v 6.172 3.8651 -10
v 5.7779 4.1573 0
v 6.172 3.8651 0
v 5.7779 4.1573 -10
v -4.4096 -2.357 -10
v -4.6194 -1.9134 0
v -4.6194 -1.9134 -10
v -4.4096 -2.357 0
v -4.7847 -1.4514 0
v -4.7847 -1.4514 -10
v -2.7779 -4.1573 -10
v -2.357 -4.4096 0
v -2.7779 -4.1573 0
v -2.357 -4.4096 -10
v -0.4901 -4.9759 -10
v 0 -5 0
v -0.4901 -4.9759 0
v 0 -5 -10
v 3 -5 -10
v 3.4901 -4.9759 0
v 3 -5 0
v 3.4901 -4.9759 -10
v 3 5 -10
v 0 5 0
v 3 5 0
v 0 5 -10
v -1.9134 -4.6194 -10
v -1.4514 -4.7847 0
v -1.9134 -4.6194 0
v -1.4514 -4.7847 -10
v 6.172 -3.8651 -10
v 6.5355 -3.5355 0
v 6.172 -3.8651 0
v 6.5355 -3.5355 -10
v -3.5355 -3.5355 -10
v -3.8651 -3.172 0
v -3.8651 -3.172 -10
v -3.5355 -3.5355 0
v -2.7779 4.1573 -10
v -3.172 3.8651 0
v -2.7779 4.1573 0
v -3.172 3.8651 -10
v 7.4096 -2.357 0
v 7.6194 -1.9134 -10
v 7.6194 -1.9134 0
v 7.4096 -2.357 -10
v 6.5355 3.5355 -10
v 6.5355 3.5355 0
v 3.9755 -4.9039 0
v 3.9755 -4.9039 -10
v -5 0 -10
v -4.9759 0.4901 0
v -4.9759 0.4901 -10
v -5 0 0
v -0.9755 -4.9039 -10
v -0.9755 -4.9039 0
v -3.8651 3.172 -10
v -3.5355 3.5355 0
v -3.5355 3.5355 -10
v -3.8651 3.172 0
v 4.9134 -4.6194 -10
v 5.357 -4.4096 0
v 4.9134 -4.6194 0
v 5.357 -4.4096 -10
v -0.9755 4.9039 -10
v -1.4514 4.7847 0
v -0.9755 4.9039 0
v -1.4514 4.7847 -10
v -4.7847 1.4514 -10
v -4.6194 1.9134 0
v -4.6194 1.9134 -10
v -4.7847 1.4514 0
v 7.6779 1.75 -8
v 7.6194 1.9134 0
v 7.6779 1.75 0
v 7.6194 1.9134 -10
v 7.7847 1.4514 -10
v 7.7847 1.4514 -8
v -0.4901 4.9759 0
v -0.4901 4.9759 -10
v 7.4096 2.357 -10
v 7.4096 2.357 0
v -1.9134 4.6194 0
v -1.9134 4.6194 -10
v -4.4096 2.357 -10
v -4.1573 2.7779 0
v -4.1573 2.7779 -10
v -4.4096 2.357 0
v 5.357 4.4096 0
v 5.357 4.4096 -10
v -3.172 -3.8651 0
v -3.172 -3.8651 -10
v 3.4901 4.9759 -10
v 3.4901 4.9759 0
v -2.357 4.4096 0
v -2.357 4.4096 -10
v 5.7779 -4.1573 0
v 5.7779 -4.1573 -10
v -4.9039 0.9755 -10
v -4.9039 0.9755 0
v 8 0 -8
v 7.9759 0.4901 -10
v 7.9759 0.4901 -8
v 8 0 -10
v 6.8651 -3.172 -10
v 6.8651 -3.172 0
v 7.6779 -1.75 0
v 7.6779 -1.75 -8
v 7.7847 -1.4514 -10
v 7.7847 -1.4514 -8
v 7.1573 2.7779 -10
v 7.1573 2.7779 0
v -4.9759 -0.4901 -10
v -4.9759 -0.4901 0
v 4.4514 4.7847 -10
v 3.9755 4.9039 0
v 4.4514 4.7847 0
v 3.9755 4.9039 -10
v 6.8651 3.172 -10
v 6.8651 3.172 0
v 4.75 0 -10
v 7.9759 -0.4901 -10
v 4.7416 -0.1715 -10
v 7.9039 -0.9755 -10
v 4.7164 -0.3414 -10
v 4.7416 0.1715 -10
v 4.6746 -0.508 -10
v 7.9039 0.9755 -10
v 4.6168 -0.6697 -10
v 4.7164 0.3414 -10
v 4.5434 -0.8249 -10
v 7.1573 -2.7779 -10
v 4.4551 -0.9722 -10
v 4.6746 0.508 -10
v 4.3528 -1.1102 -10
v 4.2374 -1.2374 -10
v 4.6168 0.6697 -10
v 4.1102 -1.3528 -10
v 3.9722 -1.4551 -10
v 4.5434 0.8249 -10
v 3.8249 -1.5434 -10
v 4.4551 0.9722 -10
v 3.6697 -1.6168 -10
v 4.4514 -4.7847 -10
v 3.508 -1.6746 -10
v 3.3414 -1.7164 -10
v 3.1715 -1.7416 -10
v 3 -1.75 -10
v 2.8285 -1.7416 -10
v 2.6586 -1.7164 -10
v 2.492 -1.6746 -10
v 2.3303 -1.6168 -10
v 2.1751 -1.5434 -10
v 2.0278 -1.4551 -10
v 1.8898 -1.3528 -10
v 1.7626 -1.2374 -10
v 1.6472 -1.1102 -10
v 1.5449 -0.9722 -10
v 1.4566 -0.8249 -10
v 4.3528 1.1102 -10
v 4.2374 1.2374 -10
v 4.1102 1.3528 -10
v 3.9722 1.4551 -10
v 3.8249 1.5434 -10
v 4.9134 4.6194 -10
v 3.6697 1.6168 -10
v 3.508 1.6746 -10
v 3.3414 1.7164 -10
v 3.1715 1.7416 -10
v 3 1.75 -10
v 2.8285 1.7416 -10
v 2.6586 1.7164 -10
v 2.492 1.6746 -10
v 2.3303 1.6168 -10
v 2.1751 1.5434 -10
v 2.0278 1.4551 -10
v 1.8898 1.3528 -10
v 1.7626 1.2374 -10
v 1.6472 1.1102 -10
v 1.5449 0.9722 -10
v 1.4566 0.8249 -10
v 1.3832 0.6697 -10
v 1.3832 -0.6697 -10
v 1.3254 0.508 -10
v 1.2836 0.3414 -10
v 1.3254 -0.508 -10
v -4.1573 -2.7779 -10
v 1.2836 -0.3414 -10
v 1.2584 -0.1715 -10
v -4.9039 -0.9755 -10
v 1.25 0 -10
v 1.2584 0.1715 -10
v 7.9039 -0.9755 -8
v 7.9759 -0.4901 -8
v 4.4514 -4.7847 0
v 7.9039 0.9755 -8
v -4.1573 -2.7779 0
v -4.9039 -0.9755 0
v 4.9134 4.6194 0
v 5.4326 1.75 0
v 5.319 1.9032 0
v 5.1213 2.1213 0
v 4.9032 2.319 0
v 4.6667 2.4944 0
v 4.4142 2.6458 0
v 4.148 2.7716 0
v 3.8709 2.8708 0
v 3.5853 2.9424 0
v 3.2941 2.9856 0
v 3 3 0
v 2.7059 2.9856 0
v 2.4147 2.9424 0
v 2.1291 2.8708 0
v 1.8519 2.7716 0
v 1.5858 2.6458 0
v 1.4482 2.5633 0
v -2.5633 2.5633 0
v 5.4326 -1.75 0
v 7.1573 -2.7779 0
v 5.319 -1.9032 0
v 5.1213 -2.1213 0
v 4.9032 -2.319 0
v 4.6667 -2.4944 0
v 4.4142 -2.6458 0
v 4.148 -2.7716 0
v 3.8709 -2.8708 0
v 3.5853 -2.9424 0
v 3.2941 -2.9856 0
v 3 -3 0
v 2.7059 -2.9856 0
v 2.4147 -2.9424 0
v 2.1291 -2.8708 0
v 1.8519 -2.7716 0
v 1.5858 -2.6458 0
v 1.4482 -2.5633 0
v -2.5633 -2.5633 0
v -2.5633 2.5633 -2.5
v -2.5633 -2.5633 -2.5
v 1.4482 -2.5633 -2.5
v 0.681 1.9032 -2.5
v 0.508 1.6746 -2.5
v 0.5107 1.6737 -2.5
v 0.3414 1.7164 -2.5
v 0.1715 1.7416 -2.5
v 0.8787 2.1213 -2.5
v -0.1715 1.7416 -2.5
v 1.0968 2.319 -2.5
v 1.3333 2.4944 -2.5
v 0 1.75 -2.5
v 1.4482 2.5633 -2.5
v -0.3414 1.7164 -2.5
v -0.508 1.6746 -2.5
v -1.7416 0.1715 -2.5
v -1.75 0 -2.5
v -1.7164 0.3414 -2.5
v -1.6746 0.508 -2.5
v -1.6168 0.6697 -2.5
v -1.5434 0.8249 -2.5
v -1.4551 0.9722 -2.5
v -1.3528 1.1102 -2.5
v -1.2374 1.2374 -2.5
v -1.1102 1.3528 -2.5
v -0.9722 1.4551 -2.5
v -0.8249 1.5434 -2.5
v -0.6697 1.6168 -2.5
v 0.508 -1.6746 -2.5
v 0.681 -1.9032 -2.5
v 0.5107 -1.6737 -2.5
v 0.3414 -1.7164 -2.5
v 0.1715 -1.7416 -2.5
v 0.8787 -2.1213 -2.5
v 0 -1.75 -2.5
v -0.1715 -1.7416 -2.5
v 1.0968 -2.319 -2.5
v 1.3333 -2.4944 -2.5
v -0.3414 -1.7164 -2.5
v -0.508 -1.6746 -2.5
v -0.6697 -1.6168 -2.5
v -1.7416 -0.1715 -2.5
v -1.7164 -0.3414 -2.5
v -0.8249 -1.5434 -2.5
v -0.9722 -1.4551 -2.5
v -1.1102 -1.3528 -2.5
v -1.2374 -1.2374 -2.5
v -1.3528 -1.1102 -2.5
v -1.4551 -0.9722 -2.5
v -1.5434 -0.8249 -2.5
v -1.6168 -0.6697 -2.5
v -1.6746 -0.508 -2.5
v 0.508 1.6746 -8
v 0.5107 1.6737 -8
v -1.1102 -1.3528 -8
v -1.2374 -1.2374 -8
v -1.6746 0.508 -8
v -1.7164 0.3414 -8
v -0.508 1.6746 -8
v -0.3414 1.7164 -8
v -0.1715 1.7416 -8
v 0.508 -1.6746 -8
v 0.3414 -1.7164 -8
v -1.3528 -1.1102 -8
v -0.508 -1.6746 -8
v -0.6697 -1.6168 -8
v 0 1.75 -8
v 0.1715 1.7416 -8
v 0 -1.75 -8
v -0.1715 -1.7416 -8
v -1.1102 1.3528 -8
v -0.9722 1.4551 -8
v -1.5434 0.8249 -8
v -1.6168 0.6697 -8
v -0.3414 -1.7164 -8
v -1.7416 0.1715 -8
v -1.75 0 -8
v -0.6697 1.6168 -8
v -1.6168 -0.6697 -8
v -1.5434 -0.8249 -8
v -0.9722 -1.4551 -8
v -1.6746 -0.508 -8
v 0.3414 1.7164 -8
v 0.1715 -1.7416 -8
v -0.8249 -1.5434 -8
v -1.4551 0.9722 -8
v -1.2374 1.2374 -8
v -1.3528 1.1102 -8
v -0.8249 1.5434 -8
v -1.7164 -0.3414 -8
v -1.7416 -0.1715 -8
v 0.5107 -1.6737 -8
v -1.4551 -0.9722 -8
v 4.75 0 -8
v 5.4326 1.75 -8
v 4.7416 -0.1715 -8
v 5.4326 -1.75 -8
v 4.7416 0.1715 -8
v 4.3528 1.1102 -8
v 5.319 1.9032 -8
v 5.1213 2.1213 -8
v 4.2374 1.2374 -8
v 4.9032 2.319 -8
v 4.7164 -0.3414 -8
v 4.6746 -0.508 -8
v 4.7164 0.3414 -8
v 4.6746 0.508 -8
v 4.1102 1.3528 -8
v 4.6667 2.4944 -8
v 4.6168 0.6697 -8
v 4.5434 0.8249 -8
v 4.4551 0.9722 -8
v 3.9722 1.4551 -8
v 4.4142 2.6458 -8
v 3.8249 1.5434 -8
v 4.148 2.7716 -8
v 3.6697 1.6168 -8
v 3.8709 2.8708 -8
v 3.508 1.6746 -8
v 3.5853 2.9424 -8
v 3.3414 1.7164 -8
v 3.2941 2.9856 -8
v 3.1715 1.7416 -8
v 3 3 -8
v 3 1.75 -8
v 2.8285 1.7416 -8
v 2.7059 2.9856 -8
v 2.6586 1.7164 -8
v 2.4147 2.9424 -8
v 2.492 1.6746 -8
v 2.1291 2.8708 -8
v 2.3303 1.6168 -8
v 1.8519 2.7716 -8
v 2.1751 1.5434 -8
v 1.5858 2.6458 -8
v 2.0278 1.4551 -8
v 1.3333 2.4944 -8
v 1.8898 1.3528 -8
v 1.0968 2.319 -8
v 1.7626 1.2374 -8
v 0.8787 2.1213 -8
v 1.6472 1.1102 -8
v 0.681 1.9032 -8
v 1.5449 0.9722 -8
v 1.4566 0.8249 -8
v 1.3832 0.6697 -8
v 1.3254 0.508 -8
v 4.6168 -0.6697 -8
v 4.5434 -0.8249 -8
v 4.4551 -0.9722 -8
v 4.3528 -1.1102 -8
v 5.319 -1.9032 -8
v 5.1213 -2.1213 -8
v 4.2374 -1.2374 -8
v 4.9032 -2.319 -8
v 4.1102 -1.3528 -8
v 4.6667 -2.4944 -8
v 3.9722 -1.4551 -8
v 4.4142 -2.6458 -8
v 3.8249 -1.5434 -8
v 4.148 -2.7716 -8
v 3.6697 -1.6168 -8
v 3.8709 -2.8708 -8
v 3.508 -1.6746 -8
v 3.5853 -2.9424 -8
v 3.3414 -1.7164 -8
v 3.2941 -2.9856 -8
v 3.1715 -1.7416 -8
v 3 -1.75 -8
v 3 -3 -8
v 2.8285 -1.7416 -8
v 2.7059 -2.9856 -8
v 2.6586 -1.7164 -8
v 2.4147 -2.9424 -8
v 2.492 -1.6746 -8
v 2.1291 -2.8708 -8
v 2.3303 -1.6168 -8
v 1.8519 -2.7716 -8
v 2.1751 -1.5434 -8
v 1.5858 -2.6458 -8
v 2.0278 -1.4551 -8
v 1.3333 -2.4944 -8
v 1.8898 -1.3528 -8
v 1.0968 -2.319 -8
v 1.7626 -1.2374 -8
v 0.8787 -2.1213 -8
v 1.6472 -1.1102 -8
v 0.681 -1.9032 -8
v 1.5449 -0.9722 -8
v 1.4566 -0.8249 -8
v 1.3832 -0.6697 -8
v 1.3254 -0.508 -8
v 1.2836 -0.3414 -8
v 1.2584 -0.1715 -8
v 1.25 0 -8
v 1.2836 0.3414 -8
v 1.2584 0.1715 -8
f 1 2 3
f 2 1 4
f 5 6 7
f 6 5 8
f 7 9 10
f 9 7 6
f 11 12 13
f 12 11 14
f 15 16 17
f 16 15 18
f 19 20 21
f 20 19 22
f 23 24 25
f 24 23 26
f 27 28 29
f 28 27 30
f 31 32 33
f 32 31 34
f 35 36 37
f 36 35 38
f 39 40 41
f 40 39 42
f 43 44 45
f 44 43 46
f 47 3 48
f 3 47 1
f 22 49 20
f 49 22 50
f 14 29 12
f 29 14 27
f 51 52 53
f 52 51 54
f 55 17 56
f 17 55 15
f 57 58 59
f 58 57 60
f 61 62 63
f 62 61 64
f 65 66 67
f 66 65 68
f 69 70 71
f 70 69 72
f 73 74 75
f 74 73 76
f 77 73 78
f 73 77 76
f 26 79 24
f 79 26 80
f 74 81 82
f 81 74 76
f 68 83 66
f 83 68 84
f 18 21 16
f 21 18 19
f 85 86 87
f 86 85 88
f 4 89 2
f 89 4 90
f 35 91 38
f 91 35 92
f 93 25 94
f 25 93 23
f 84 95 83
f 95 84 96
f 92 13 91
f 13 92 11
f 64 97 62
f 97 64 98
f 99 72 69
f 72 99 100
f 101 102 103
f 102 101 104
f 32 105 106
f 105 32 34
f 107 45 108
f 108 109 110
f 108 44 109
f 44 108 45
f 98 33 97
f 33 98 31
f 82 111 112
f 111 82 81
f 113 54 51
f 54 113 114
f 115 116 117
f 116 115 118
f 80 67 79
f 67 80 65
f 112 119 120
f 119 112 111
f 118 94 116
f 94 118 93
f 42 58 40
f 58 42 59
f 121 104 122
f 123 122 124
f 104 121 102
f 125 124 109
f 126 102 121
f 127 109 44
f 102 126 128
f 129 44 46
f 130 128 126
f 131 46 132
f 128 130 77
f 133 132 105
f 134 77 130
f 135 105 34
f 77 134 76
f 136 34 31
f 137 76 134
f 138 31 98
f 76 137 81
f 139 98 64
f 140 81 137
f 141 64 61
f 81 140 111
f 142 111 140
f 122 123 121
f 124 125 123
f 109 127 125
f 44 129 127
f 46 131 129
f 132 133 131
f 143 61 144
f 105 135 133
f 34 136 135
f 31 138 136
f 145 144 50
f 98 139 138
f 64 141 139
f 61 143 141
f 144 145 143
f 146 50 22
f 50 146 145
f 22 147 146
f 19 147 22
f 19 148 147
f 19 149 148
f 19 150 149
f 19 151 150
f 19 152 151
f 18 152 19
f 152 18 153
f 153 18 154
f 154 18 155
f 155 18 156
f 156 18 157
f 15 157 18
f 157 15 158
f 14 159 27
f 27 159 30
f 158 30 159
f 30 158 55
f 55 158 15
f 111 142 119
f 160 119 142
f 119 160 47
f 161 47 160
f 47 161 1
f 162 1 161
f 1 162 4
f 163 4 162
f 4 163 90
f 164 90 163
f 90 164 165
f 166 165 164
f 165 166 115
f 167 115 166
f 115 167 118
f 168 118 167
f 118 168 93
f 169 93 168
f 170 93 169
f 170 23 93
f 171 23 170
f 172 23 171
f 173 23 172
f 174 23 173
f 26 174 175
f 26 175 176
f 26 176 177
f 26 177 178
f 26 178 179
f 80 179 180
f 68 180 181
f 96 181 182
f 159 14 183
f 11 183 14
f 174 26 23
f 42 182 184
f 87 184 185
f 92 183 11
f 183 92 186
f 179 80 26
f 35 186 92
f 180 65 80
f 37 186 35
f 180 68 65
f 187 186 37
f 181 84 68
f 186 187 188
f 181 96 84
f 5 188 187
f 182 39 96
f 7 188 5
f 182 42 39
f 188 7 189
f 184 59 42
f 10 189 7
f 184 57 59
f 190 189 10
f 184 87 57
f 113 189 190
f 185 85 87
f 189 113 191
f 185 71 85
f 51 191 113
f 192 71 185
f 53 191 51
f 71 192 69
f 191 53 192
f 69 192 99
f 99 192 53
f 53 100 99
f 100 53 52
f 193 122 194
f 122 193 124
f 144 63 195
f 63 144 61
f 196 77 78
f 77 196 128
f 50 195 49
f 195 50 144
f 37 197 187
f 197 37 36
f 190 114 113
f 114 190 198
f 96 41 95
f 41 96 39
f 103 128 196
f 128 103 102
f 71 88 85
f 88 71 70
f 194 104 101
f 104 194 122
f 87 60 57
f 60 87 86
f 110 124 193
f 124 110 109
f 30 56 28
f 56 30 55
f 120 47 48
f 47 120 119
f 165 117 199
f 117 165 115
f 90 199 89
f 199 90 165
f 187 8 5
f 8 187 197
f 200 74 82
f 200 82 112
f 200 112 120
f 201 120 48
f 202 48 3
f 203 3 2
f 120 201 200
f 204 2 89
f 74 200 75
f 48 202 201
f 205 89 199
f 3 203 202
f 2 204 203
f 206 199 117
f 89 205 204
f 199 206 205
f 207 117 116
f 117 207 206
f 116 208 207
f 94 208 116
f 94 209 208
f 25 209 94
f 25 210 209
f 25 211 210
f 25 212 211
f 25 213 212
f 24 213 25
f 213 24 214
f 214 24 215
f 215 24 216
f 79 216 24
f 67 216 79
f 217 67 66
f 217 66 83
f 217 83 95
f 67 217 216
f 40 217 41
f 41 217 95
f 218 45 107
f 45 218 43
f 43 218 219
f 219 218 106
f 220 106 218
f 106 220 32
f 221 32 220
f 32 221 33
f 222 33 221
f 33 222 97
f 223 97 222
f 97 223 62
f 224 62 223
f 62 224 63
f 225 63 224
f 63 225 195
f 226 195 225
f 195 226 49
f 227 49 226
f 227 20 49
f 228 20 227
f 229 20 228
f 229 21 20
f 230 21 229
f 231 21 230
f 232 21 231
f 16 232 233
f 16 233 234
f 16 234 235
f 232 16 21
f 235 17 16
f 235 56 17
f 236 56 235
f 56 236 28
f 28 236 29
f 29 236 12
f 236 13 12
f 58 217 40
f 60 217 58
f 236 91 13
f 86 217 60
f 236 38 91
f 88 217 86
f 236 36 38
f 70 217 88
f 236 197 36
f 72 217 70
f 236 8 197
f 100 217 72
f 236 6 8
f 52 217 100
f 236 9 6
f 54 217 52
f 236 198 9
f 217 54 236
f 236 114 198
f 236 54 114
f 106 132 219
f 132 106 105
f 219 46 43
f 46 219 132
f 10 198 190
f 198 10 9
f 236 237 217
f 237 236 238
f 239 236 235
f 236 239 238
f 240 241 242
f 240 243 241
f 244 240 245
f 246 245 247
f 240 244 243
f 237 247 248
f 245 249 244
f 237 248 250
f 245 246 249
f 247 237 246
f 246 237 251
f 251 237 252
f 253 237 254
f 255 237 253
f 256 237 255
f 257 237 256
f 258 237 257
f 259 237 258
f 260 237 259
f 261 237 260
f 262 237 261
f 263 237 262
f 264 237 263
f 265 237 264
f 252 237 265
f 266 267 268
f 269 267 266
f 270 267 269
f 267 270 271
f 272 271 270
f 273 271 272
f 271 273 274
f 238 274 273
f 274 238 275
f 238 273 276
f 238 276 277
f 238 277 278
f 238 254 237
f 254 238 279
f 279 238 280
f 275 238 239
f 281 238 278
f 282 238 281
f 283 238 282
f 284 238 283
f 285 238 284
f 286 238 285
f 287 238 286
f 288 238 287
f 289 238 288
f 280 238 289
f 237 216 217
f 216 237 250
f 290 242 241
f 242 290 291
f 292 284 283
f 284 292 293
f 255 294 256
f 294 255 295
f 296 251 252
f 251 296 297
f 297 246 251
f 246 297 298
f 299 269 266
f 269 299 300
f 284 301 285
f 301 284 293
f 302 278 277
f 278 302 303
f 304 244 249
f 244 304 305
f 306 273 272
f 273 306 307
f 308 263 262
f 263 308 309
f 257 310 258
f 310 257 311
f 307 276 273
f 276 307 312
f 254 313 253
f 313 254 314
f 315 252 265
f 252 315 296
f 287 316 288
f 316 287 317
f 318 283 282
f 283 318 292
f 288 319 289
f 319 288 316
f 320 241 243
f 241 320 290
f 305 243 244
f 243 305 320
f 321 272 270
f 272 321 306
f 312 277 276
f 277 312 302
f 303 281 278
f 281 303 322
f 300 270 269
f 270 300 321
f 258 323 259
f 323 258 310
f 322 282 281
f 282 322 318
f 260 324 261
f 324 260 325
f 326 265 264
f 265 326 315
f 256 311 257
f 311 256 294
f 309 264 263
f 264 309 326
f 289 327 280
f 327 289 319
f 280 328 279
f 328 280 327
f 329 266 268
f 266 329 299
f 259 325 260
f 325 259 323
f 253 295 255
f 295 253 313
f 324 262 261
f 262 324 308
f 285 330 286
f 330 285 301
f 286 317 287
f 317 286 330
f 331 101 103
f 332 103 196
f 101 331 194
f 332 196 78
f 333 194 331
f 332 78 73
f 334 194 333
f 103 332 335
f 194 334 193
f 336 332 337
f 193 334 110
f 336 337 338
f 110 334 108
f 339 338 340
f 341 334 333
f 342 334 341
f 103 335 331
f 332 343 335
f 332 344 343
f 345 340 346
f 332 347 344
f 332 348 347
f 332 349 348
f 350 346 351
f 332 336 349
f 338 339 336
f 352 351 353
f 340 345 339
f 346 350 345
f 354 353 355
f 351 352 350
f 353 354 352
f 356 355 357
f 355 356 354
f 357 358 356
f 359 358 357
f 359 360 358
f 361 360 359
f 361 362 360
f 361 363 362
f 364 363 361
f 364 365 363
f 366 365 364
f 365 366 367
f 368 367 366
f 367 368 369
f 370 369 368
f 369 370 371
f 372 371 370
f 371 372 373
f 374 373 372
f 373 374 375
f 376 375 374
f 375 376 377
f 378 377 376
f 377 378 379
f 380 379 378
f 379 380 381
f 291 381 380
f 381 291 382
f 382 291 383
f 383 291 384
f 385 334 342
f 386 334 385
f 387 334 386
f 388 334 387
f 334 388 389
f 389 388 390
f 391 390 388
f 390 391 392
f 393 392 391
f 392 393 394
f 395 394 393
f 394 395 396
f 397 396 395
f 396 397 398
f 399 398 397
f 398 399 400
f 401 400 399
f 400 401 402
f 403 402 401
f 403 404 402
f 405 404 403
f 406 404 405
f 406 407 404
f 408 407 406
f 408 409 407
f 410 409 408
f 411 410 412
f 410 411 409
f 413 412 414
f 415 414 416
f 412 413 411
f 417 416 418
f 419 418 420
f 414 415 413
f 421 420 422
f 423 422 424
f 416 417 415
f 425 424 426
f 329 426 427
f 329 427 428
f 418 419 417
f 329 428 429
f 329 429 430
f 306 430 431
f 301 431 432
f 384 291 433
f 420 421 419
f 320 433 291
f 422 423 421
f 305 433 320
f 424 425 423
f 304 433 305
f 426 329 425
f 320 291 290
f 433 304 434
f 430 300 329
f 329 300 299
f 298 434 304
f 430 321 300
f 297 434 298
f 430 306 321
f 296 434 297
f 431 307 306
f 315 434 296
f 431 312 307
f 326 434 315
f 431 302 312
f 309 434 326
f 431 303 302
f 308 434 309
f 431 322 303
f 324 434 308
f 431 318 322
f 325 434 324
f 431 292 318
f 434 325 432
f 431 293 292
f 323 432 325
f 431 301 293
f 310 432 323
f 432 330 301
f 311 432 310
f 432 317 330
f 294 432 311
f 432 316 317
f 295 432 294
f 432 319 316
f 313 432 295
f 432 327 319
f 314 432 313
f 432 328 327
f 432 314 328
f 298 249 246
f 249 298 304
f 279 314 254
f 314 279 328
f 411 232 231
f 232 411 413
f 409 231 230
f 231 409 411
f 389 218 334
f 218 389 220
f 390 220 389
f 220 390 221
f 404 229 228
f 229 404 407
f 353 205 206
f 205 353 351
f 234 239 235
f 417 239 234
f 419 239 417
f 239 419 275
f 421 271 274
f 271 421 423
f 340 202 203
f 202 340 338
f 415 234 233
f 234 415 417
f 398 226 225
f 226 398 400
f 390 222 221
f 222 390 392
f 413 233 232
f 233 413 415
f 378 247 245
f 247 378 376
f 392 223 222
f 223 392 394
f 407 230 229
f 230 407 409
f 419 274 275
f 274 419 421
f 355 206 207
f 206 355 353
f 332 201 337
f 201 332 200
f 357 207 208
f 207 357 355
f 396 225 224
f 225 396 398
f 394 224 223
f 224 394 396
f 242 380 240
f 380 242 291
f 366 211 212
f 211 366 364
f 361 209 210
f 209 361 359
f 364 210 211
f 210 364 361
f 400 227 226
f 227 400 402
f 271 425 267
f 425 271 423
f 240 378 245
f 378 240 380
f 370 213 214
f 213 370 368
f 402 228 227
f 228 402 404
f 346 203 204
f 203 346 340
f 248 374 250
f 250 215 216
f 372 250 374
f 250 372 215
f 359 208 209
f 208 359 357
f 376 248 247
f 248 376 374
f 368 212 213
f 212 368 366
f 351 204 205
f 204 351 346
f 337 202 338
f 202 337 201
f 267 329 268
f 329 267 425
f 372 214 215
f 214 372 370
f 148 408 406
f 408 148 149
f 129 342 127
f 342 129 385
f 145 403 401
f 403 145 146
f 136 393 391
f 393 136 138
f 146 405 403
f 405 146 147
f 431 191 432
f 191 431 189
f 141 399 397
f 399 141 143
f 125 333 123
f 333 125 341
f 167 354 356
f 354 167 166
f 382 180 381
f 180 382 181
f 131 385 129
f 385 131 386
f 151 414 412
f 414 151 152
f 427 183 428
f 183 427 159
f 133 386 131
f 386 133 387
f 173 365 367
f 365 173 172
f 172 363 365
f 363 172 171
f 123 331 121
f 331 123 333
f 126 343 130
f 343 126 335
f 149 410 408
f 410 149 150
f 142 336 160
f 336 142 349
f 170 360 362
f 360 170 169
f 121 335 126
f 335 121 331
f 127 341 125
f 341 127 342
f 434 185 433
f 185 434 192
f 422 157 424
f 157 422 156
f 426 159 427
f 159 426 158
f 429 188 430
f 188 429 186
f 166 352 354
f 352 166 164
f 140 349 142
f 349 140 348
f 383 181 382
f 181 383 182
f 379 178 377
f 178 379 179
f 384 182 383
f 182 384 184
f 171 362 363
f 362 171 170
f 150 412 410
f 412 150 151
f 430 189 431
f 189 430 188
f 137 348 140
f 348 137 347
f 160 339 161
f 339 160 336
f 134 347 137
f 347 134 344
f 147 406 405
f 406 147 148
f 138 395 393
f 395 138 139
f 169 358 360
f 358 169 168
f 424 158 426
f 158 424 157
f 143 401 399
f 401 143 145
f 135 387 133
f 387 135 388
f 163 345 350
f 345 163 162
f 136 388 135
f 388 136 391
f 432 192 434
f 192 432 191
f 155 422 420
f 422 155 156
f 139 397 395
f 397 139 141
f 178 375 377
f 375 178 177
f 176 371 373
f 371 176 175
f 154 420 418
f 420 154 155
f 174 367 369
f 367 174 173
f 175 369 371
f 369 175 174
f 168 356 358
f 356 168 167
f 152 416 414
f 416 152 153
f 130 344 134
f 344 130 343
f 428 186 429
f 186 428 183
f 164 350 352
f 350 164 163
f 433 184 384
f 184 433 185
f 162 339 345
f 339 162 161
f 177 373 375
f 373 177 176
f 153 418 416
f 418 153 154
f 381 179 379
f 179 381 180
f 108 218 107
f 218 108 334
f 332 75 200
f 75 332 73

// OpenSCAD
module version_one() 
{
    difference()
    {
        hull()
        {
            cylinder(d=10, h=10.5, $fn=64);
            translate([3, 0, 0]) cylinder(d=10, h=10.5, $fn=64);
        }
        cylinder(d=6.5, h=2.5, $fn=6);
        cylinder(d=3.5, h=5, $fn=64);
        translate([3, 0, 8]) cylinder(d=6.5, h=2.5, $fn=6);
        translate([3, 0, 5.5]) cylinder(d=3.5, h=5, $fn=64);
    }
}

module version_two() 
{
    difference()
    {
        hull()
        {
            cylinder(d=10, h=10, $fn=64);
            translate([3, 0, 0]) cylinder(d=10, h=10, $fn=64);
        }
        rotate([0, 0, 45]) cylinder(d=7.25, h=2.5, $fn=4);
        cylinder(d=3.5, h=8, $fn=64);
        translate([3, 0, 0]) cylinder(d=6, h=8, $fn=64);
        translate([3, 0, 0]) cylinder(d=3.5, h=10, $fn=64);
        translate([5, -1.75, 0]) cube([6, 3.5, 8]);
    }
}

rotate([180, 0, 0])
version_two();
